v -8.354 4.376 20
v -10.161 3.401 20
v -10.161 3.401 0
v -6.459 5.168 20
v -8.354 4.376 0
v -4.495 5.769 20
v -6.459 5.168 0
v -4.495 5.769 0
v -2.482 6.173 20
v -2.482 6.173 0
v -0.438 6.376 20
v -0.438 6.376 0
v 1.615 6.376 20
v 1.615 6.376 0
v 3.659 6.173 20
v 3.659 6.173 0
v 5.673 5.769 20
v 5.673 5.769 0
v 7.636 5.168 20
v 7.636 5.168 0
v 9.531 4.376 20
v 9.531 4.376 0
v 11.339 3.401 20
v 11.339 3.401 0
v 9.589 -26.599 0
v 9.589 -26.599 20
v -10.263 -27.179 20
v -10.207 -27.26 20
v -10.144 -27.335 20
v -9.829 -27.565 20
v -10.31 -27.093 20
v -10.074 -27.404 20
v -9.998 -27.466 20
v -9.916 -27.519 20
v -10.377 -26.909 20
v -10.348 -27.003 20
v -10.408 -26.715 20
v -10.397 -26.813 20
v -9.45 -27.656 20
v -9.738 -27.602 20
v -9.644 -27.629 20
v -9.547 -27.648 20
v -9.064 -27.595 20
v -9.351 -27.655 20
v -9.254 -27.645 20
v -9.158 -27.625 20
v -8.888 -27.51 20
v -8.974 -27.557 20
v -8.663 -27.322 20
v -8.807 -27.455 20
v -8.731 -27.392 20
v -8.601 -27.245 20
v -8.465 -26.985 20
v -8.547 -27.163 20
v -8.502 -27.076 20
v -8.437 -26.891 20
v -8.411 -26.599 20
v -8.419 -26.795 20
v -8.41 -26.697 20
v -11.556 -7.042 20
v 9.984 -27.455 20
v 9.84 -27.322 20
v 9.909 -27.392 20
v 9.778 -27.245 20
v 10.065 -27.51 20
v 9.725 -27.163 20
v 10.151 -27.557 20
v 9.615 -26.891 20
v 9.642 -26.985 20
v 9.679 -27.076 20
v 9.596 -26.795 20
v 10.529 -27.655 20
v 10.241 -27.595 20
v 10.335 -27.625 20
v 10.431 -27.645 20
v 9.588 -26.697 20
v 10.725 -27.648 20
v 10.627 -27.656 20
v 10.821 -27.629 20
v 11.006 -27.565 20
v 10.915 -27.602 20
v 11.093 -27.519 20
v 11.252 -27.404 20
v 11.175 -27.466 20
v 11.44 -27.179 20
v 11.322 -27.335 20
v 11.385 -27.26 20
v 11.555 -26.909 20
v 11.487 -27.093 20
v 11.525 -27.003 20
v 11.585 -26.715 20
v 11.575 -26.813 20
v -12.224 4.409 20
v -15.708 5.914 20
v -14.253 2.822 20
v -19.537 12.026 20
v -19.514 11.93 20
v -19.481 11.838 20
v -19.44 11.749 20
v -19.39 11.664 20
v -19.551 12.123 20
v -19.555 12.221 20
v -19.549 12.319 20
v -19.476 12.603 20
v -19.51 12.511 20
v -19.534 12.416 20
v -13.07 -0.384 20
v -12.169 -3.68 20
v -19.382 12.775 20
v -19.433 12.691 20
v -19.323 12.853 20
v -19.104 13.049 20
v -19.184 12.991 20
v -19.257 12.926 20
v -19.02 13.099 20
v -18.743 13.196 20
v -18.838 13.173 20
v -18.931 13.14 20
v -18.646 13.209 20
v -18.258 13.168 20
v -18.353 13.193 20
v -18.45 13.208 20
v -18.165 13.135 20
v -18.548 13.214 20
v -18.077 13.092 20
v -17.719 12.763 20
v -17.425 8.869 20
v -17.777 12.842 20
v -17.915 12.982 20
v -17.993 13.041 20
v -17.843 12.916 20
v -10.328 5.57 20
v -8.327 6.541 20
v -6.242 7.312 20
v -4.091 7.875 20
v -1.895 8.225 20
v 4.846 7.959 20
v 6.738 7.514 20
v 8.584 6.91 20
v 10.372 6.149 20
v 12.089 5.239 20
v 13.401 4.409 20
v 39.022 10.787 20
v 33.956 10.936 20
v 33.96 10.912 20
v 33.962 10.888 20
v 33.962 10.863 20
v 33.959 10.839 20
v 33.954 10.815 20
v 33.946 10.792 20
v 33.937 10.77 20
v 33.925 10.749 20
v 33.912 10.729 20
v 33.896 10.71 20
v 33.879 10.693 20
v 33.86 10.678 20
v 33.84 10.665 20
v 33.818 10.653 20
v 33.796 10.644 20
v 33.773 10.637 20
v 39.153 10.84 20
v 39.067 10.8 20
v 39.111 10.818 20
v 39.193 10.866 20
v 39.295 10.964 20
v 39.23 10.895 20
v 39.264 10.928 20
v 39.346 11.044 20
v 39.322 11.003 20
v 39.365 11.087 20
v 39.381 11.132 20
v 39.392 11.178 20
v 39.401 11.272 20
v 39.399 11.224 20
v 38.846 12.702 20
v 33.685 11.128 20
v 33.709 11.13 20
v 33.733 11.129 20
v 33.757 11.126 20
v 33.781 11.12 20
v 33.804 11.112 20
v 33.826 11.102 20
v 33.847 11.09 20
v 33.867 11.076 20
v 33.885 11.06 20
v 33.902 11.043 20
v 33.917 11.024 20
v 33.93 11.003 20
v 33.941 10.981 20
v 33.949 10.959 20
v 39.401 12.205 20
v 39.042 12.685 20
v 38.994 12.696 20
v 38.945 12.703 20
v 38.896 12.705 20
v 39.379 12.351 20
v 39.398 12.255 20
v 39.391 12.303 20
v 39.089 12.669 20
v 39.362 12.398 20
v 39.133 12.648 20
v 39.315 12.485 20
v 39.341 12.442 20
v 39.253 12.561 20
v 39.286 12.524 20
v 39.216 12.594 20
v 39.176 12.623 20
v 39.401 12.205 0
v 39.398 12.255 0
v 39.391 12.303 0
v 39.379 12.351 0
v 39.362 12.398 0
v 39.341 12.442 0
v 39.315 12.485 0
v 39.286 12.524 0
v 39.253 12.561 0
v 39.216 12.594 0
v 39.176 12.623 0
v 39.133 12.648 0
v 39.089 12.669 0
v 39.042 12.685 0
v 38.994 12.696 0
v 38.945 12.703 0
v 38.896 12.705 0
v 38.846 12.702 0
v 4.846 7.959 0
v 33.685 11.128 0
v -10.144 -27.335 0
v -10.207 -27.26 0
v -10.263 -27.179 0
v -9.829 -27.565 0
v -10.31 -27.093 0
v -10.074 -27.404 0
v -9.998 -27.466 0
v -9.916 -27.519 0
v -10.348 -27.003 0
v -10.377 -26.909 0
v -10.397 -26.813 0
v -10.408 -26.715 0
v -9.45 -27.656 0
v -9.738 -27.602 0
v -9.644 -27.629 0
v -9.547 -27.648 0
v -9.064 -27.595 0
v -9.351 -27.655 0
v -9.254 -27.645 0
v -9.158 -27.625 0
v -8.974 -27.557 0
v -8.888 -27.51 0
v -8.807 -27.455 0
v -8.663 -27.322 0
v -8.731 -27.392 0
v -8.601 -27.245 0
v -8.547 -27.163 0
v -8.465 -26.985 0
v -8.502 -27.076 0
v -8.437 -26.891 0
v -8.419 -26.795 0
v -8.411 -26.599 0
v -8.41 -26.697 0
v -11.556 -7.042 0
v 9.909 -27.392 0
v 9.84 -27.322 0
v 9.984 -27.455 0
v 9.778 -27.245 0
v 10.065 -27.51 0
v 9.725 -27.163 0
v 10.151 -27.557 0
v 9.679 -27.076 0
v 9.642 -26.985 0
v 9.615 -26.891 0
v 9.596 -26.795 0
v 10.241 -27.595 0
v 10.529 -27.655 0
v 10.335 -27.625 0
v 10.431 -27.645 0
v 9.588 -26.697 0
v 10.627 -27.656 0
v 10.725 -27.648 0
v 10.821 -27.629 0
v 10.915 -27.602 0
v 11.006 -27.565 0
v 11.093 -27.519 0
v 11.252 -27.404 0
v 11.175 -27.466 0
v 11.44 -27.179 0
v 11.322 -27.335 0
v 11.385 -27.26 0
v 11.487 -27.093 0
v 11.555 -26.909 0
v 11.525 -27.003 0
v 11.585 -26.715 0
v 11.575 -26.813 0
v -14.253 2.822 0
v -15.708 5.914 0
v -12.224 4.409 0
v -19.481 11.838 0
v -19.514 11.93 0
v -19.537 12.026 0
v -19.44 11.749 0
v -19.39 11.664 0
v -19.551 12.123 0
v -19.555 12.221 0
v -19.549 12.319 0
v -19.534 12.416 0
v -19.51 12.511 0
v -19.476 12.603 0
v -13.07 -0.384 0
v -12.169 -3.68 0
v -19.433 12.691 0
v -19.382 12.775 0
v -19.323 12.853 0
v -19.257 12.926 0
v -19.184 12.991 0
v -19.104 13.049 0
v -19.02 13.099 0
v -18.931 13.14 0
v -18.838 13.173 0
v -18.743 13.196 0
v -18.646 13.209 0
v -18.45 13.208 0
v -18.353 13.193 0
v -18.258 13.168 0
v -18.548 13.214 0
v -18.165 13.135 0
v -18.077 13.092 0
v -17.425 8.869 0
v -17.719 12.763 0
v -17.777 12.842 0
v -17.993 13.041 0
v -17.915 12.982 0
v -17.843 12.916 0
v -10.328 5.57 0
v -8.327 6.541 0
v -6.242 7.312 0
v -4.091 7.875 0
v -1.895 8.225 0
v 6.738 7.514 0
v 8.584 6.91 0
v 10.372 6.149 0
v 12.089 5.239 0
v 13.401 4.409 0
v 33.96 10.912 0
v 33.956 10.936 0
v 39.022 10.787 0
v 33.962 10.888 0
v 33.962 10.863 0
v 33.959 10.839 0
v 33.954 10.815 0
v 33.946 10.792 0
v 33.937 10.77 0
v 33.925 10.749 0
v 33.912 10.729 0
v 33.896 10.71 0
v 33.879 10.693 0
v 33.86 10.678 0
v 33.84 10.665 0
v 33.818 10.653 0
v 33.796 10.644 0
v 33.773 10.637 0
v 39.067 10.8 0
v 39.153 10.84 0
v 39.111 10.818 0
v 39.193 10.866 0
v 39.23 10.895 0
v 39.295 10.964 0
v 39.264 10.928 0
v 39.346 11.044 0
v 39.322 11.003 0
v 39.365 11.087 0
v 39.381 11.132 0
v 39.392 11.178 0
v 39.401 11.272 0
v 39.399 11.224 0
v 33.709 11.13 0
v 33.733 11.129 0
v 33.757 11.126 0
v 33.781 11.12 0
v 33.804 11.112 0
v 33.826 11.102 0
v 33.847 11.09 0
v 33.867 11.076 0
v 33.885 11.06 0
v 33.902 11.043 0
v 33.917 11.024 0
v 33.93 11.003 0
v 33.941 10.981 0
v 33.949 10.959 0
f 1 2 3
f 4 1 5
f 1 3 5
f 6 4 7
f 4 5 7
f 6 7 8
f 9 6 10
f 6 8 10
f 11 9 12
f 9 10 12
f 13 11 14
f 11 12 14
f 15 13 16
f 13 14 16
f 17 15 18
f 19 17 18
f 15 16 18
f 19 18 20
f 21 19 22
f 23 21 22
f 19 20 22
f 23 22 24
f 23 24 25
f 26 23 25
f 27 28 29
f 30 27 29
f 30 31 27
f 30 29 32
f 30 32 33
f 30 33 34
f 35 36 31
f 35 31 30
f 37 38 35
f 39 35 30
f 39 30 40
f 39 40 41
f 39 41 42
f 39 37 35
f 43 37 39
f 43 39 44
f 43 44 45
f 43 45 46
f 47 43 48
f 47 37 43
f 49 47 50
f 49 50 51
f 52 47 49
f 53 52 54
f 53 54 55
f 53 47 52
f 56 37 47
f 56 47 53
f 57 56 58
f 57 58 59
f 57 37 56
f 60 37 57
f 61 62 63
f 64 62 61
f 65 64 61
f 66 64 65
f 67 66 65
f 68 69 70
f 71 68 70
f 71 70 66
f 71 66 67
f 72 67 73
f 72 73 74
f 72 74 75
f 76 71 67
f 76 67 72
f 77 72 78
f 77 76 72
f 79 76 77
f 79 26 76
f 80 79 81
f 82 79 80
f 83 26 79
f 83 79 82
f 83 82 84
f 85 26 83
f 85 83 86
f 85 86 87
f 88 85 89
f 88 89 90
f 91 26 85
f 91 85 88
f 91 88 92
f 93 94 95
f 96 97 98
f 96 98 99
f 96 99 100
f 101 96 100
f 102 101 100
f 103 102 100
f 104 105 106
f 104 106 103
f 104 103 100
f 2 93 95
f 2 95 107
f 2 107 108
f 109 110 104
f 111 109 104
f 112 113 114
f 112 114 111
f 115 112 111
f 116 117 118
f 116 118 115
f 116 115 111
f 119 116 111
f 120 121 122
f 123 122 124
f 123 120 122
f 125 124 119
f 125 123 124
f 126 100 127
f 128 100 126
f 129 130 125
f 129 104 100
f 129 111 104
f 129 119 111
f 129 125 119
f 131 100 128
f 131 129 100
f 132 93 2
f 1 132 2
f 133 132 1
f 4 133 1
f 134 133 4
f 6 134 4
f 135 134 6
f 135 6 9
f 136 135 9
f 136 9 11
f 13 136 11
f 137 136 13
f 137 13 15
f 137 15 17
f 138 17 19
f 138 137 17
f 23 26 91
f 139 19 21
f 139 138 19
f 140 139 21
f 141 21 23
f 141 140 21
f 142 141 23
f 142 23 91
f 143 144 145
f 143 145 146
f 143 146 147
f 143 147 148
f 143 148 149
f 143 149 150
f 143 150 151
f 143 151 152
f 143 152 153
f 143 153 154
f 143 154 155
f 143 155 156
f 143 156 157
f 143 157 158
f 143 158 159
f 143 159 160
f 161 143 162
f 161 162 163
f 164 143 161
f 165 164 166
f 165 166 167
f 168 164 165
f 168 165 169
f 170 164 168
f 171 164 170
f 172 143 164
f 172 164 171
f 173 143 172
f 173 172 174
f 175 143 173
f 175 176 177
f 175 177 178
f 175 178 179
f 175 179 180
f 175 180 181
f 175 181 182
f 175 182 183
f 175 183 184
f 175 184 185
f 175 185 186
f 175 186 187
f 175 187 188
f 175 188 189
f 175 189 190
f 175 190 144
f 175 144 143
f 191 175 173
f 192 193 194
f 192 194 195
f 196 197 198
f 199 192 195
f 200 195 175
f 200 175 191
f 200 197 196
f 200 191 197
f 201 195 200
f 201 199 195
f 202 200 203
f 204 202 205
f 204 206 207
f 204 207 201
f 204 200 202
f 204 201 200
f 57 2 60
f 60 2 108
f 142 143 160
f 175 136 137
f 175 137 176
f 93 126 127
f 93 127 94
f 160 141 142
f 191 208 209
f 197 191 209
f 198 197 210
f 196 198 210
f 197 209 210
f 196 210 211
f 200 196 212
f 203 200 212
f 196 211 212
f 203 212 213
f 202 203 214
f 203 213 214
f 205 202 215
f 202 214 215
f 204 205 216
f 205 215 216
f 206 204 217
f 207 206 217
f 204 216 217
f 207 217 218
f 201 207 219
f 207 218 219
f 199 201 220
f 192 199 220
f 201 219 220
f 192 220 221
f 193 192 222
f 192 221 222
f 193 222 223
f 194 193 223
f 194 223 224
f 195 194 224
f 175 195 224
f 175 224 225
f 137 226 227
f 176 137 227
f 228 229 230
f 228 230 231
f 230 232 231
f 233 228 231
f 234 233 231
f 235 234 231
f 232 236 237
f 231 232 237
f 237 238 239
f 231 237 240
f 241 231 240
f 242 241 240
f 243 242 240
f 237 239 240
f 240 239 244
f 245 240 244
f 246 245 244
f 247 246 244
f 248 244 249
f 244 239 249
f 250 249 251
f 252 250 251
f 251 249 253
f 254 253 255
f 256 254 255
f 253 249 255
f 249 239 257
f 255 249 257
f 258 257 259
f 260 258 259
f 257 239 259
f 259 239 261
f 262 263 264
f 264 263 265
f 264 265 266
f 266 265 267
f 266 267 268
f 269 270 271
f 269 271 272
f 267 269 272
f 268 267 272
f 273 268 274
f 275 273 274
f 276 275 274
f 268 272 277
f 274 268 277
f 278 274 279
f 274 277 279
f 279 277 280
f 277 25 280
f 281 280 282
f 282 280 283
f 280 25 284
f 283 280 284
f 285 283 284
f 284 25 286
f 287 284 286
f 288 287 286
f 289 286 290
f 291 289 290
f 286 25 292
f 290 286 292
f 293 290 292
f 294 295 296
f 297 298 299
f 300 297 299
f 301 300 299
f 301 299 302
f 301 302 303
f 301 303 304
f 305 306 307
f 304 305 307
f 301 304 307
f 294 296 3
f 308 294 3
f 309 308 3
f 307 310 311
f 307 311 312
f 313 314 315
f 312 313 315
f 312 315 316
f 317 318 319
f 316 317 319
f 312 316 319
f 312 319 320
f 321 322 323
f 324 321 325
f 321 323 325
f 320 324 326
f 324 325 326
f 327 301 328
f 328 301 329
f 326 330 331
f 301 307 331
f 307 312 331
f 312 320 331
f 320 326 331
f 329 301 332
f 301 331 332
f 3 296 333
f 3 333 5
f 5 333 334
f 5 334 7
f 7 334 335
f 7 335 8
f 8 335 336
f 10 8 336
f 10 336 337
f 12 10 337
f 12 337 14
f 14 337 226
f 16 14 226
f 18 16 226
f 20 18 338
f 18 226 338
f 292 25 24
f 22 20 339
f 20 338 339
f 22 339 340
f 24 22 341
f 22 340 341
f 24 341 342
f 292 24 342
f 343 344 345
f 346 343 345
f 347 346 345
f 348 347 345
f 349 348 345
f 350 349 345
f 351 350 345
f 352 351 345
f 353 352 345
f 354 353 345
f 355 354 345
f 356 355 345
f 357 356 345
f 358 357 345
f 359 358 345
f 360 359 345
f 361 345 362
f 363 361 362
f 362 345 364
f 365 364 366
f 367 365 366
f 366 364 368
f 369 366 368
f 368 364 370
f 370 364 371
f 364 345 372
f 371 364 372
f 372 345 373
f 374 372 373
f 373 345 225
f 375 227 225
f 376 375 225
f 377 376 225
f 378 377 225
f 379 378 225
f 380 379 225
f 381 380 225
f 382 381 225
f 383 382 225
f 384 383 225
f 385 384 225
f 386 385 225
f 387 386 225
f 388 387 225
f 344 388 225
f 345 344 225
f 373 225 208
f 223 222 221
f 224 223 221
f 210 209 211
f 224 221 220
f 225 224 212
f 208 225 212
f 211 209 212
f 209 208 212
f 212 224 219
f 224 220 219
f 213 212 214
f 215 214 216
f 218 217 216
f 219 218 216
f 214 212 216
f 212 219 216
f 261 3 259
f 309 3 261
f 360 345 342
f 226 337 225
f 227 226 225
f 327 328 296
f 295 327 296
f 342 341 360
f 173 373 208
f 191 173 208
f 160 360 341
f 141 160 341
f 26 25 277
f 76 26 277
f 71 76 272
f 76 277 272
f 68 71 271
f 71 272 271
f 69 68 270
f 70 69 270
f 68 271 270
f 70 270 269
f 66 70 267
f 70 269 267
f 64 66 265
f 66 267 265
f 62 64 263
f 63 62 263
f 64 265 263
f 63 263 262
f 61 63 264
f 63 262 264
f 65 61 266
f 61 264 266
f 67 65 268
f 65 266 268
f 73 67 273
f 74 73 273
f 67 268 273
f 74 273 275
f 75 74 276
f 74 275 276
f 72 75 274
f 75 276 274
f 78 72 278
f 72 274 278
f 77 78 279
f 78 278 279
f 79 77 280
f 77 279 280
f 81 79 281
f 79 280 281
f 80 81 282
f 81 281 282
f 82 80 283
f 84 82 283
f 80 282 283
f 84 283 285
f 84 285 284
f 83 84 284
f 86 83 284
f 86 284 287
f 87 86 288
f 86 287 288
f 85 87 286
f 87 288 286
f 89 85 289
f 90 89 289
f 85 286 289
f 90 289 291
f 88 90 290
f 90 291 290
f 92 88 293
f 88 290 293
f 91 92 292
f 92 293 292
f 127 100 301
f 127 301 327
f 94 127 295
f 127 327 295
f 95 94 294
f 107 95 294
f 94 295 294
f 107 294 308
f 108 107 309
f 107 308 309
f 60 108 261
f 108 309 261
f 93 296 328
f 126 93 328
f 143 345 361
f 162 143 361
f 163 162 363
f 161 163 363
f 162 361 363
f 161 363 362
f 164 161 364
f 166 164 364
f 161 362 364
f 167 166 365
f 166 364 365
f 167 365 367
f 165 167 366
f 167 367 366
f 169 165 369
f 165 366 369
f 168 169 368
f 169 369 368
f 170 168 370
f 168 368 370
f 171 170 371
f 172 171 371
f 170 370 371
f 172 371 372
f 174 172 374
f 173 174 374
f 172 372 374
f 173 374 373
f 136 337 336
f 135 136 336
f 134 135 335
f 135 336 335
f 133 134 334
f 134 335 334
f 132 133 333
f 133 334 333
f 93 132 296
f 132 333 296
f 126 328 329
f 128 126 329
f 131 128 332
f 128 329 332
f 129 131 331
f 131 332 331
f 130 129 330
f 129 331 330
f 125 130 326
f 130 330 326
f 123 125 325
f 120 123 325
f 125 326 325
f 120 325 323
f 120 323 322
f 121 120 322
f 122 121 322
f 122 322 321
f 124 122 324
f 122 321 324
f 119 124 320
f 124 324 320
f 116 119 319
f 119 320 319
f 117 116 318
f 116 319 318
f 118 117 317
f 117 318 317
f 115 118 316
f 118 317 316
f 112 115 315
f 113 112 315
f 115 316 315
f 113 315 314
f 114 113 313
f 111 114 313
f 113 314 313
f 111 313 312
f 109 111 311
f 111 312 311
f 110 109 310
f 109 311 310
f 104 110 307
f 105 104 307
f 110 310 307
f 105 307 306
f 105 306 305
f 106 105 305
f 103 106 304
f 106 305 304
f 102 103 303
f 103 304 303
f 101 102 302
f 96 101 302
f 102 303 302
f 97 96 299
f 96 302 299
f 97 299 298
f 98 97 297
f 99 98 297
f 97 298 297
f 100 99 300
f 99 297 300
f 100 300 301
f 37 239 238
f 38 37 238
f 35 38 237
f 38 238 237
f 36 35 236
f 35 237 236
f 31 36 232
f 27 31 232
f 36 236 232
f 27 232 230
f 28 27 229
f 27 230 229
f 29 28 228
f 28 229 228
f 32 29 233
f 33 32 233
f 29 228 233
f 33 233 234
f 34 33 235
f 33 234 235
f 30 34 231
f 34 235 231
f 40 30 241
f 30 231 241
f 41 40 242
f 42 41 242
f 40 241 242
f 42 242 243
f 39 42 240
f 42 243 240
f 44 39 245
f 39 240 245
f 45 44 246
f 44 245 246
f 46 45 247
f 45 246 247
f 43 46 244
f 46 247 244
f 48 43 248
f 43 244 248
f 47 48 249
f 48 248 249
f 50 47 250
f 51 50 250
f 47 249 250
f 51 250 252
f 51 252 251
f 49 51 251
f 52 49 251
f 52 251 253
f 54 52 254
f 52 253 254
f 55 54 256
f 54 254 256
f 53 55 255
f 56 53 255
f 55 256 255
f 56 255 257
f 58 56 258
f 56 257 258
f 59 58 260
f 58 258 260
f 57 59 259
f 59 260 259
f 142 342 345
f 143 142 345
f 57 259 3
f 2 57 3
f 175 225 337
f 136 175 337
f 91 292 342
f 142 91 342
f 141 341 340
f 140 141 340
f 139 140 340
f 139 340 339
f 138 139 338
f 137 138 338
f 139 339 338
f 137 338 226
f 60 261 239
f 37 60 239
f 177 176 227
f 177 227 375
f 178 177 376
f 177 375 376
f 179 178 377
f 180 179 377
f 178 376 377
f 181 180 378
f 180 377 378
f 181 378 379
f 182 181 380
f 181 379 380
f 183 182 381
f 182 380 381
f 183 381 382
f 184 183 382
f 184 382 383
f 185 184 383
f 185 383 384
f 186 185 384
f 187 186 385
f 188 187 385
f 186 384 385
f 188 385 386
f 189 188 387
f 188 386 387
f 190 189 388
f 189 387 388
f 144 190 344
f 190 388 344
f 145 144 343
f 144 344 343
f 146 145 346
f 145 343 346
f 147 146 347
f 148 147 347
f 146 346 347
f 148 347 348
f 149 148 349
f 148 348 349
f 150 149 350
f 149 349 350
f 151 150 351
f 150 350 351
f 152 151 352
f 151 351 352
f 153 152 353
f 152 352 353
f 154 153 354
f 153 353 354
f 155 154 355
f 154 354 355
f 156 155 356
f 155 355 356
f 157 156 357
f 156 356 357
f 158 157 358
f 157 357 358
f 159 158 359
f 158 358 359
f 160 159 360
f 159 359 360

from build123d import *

# Parameters (mm, degrees)
F1_DEPTH = 20


with BuildPart() as f1:
    # F0 (on Top) → F1 (new body)
    with BuildSketch(Plane.XY):
        with BuildLine():
            ThreePointArc((-10.407943, -26.715306), (-9.351406, -27.655374), (-8.411337, -26.598837))
            Line((-8.411337, -26.598837), (-10.407943, -26.715306))
        make_face()
        with BuildLine():
            Line((11.585269, -26.715306), (9.588663, -26.598837))
            ThreePointArc((9.588663, -26.598837), (10.528732, -27.655374), (11.585269, -26.715306))
        make_face()
        with BuildLine():
            ThreePointArc((-10.161337, 3.401163), (0.588663, 6.401163), (11.338663, 3.401163))
            Line((11.338663, 3.401163), (9.588663, -26.598837))
            Line((9.588663, -26.598837), (11.585269, -26.715306))
            Line((11.585269, -26.715306), (13.400839, 4.40875))
            ThreePointArc((13.400839, 4.40875), (12.751886, 4.835248), (12.08875, 5.23934))
            ThreePointArc((12.08875, 5.23934), (8.584038, 6.909612), (4.846286, 7.959386))
            ThreePointArc((4.846286, 7.959386), (1.485483, 8.343819), (-1.895165, 8.225455))
            ThreePointArc((-1.895165, 8.225455), (-7.293833, 6.951665), (-12.223513, 4.40875))
            Line((-12.223513, 4.40875), (-11.555542, -7.042185))
            Line((-11.555542, -7.042185), (-10.407943, -26.715306))
            Line((-10.407943, -26.715306), (-8.411337, -26.598837))
            Line((-8.411337, -26.598837), (-10.161337, 3.401163))
        make_face()
        with BuildLine():
            ThreePointArc((-19.390229, 11.663968), (-14.25265, 2.821962), (-11.555542, -7.042185))
            Line((-11.555542, -7.042185), (-12.223513, 4.40875))
            Line((-12.223513, 4.40875), (-17.719352, 12.763136))
            Line((-17.719352, 12.763136), (-19.390229, 11.663968))
        make_face()
        with BuildLine():
            ThreePointArc((-17.719352, 12.763136), (-19.104374, 13.04899), (-19.390229, 11.663968))
            Line((-19.390229, 11.663968), (-17.719352, 12.763136))
        make_face()
        with BuildLine():
            ThreePointArc((12.08875, 5.23934), (12.751886, 4.835248), (13.400839, 4.40875))
            Line((13.400839, 4.40875), (39.021619, 10.786566))
            ThreePointArc((39.021619, 10.786566), (39.294787, 10.963855), (39.400839, 11.271759))
            Line((39.400839, 11.271759), (39.400839, 12.205185))
            ThreePointArc((39.400839, 12.205185), (39.234526, 12.577547), (38.846227, 12.702194))
            Line((38.846227, 12.702194), (-1.895165, 8.225455))
            ThreePointArc((-1.895165, 8.225455), (1.485483, 8.343819), (4.846286, 7.959386))
            Line((4.846286, 7.959386), (33.684866, 11.128222))
            ThreePointArc((33.684866, 11.128222), (33.958279, 10.923665), (33.772562, 10.637121))
            Line((33.772562, 10.637121), (12.08875, 5.23934))
        make_face()
    extrude(amount=F1_DEPTH)


solid = f1.part
